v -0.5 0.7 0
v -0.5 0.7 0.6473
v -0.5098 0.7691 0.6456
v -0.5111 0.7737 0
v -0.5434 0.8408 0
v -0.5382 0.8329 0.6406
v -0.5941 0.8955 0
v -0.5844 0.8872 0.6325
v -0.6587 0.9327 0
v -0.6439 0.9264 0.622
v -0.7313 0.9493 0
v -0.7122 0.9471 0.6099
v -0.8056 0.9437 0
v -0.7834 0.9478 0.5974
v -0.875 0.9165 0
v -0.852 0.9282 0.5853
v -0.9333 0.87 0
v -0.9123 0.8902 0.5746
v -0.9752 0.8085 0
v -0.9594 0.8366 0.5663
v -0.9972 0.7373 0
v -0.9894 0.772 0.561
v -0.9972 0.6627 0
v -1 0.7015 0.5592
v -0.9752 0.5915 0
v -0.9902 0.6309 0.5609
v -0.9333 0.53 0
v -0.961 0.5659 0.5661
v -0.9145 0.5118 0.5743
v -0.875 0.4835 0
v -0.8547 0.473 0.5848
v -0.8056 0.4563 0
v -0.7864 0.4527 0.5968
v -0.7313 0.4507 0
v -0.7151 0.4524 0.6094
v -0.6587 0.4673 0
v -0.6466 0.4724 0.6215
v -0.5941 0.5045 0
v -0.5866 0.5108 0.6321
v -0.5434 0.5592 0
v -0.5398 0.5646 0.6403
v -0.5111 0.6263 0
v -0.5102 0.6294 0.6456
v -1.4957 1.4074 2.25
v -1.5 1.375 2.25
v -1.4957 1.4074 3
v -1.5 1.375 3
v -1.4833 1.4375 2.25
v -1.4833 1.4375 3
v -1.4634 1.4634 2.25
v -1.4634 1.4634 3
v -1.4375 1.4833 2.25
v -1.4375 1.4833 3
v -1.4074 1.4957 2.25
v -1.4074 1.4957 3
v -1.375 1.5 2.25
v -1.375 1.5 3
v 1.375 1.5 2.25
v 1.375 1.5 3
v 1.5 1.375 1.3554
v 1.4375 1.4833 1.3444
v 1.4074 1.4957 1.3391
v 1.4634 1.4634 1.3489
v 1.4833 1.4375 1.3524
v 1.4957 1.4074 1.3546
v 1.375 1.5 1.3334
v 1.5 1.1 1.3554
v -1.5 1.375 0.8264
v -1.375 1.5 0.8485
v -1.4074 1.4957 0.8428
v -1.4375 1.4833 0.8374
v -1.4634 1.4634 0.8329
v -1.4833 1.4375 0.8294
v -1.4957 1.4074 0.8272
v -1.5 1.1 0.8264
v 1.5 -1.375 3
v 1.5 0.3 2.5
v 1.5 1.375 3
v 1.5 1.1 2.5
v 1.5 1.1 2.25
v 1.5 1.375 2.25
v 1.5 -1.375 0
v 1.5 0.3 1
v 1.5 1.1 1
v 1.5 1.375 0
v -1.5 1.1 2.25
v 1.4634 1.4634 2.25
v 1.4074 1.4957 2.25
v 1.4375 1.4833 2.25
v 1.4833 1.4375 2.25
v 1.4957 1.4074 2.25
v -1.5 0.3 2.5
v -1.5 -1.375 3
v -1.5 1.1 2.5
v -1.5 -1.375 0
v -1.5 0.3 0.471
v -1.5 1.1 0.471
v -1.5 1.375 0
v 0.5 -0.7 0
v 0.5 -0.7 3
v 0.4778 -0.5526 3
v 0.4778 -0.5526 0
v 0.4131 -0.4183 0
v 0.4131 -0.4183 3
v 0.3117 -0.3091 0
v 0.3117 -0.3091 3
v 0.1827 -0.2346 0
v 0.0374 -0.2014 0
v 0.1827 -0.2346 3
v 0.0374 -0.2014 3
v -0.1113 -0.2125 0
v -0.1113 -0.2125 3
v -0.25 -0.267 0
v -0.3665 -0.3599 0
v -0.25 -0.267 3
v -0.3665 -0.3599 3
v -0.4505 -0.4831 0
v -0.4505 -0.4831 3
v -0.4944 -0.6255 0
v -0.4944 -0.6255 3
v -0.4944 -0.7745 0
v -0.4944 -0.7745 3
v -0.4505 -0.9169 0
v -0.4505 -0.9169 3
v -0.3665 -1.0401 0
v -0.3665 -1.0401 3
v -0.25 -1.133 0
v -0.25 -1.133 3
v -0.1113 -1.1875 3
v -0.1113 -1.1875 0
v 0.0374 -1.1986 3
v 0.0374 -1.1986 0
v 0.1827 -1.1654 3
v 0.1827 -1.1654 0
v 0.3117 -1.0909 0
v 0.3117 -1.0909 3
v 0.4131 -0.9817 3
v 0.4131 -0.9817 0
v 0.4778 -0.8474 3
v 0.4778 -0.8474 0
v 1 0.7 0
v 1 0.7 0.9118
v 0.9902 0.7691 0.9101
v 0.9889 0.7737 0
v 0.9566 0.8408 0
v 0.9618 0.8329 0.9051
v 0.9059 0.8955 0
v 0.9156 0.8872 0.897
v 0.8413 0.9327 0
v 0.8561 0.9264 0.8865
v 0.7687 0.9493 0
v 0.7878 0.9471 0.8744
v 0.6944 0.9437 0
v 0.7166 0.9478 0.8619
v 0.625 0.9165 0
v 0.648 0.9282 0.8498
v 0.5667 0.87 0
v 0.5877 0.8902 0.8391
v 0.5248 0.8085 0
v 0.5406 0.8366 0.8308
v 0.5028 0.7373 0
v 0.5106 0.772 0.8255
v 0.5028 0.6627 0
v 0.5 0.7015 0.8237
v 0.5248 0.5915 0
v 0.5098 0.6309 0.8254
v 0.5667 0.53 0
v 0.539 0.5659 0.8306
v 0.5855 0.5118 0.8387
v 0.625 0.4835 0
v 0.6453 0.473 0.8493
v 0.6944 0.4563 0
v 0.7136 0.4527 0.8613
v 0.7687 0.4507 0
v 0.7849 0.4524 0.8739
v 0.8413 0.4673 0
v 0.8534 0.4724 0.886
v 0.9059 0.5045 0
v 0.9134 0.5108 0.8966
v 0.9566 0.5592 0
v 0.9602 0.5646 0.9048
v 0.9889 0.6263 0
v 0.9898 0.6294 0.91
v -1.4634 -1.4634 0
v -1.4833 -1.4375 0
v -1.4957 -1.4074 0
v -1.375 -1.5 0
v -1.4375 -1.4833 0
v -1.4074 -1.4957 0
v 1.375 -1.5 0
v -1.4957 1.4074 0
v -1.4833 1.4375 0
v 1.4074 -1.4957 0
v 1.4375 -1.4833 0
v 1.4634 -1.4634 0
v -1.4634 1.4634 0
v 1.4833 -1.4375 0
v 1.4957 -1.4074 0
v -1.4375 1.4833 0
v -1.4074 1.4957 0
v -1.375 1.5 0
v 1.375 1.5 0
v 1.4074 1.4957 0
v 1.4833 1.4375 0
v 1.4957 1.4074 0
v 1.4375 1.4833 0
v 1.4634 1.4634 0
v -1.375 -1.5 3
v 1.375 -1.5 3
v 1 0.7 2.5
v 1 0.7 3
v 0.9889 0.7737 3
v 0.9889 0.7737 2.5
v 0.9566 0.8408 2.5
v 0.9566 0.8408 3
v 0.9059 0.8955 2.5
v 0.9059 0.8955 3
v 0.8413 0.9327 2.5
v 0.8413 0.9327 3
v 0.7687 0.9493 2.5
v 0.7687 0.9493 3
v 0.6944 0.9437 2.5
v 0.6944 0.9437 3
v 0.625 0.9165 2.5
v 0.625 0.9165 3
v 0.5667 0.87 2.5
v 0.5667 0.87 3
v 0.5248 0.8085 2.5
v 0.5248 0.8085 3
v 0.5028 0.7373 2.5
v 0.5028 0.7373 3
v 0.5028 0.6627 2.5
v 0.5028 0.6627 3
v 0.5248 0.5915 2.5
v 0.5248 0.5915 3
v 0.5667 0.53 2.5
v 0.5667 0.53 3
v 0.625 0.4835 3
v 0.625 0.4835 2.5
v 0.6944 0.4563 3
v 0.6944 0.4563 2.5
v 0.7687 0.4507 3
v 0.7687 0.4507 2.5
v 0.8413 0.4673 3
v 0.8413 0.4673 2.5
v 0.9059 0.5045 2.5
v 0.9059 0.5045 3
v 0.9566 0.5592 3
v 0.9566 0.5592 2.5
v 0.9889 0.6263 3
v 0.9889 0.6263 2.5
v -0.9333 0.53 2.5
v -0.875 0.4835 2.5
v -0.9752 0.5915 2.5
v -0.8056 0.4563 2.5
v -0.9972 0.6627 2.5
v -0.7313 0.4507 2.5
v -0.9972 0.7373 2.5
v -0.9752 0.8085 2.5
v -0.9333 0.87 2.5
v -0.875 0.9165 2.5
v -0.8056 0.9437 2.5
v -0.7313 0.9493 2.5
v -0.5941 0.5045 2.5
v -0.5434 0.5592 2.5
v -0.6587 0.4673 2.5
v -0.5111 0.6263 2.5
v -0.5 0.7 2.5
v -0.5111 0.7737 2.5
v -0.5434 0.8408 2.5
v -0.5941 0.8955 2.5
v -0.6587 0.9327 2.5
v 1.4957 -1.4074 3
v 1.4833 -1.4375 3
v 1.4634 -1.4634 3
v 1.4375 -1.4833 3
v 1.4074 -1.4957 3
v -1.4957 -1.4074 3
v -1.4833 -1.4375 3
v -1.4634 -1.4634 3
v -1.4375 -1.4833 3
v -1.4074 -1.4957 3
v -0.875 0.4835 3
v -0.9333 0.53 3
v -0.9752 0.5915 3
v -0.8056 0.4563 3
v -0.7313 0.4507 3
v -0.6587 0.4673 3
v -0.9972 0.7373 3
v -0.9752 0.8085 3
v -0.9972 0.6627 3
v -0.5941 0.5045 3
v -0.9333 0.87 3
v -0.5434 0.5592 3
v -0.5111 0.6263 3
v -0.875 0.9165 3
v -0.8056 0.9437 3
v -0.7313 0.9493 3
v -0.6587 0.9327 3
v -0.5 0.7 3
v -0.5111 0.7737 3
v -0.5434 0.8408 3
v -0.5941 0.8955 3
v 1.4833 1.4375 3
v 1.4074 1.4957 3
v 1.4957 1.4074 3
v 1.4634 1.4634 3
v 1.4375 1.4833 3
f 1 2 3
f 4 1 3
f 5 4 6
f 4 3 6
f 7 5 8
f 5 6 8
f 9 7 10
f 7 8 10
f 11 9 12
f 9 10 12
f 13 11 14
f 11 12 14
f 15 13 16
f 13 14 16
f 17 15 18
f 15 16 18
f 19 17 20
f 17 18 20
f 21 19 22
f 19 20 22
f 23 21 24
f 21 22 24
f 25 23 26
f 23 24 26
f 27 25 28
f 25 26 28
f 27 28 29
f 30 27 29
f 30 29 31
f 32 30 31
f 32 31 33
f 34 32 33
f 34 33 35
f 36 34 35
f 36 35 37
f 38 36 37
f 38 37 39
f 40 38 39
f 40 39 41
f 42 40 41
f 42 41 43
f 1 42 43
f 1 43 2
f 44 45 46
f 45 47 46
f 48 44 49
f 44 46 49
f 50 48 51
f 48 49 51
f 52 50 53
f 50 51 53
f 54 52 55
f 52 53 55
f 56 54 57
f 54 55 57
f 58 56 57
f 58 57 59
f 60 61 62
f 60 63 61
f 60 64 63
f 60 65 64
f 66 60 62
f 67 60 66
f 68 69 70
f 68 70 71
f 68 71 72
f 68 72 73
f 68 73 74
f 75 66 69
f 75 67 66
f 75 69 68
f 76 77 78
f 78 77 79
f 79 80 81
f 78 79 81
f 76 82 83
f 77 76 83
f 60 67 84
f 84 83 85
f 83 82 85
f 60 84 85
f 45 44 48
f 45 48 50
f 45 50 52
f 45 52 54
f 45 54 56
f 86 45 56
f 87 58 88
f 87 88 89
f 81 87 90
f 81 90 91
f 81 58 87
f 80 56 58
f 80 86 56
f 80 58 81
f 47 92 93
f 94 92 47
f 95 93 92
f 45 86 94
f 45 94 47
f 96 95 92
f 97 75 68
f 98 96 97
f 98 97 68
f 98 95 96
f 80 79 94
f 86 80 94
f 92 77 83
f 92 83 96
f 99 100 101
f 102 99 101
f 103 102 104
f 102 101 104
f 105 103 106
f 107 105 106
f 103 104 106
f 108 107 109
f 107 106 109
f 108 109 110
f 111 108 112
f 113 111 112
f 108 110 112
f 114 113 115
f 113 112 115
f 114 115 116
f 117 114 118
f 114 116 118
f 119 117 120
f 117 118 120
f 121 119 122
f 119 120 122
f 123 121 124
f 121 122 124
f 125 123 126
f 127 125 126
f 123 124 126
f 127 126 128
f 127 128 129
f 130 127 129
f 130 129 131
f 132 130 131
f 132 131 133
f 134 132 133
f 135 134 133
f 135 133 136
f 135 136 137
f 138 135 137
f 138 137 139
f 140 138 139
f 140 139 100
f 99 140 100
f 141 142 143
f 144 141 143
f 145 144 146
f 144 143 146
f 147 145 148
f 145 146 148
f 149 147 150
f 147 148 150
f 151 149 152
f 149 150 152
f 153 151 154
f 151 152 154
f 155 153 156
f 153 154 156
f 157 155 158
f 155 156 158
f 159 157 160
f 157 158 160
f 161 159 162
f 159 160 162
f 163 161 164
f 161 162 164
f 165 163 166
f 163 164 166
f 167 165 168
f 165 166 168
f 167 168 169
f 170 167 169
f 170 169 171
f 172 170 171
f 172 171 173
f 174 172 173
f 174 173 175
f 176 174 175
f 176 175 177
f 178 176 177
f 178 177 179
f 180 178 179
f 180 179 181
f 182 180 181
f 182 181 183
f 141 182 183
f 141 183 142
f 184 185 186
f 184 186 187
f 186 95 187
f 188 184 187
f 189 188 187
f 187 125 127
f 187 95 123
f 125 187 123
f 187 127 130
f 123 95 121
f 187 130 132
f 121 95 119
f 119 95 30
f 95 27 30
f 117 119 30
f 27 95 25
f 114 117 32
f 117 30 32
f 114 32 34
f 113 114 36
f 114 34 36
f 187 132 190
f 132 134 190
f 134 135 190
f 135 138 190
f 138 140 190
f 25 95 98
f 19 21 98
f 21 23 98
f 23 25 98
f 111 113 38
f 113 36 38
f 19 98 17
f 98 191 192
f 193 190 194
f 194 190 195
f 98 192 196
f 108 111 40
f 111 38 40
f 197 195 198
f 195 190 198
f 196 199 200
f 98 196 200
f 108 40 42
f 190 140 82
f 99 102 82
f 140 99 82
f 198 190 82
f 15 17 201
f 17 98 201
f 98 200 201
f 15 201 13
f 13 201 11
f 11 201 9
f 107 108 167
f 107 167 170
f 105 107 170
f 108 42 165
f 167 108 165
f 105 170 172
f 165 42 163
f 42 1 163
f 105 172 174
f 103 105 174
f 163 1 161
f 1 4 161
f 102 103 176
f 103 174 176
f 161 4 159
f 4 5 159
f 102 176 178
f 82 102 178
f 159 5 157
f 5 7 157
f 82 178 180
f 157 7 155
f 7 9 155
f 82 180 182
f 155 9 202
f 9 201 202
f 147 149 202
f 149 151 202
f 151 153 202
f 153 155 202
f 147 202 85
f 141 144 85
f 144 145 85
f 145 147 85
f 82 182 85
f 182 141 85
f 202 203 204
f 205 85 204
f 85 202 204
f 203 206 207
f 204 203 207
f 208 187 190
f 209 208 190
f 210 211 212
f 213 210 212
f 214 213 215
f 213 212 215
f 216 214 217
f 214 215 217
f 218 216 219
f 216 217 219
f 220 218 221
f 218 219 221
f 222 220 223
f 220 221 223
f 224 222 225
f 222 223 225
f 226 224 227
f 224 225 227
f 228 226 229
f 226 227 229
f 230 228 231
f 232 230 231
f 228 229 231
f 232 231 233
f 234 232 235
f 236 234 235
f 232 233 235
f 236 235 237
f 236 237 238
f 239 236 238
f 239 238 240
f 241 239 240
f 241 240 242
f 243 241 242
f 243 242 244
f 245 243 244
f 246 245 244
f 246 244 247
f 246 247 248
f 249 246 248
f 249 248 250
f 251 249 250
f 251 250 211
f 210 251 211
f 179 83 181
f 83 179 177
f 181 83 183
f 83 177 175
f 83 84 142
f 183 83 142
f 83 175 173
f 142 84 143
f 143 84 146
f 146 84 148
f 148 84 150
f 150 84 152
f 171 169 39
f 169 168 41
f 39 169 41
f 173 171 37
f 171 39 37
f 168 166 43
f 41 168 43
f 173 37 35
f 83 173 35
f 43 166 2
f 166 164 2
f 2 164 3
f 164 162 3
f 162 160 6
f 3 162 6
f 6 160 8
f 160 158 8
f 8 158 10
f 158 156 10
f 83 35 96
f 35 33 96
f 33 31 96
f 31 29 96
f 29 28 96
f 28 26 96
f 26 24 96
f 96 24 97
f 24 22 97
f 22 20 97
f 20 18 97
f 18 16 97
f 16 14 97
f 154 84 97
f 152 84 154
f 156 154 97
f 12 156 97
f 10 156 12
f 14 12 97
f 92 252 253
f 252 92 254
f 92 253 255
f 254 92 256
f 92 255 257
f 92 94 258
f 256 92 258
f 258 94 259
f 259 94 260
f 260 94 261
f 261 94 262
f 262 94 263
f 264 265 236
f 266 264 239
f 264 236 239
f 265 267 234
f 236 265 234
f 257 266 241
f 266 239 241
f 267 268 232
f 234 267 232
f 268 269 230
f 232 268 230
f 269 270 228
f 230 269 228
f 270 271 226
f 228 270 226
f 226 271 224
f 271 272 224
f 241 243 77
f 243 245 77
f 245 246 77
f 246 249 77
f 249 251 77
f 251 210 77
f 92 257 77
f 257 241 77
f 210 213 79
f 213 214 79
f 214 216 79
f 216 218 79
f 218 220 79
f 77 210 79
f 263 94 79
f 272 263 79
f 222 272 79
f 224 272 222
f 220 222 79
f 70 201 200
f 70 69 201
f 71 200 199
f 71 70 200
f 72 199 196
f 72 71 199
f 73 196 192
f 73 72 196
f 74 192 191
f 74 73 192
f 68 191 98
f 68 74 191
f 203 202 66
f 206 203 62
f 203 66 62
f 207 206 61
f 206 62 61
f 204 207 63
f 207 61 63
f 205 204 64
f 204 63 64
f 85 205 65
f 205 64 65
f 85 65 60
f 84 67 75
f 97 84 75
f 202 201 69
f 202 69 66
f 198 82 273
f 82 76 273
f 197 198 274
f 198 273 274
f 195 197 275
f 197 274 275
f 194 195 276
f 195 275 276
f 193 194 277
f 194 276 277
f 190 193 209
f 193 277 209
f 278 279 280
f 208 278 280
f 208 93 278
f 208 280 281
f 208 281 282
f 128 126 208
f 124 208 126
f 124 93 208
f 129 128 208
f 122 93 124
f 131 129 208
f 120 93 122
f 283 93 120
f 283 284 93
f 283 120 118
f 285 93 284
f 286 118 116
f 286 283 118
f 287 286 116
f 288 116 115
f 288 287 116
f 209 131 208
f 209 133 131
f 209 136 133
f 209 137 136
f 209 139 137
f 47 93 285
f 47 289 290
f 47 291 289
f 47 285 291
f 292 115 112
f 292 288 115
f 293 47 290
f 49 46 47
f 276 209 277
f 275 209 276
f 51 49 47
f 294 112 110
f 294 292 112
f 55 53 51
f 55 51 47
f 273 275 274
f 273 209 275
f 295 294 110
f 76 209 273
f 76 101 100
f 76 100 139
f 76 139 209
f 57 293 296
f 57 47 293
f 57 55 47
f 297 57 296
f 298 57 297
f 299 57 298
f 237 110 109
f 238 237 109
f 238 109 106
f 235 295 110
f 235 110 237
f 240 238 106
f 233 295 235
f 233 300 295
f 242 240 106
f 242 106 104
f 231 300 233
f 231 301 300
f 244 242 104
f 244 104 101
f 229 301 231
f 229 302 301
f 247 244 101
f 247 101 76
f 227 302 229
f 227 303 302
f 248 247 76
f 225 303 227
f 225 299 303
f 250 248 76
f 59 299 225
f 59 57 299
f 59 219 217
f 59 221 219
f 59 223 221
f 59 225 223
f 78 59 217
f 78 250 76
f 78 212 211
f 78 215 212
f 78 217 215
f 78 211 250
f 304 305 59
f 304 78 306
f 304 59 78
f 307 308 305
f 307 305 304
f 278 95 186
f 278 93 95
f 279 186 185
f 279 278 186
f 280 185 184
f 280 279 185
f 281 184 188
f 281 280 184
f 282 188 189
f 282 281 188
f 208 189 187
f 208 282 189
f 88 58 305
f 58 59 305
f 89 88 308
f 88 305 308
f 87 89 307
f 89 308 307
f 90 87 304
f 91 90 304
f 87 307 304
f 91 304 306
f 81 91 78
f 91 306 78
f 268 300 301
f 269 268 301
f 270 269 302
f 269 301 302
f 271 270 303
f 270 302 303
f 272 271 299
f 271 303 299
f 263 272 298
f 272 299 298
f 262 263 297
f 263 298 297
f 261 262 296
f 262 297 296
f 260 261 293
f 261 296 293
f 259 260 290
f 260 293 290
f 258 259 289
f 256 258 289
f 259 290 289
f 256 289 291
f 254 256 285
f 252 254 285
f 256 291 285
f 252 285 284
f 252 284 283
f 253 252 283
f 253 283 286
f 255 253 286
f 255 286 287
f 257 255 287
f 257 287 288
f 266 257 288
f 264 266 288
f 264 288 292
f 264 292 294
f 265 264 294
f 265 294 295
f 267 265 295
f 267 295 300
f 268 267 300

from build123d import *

# Parameters (mm, degrees)
F0_W      = 3
F0_H      = 3
F1_DEPTH  = 3
F2_R      = 0.5
F3_DEPTH  = 25
F6_DEPTH  = 0.8
F8_DEPTH  = 1.05
F9_R      = 0.125
F10_R     = 0.125
F11_R     = 0.25
F12_DEPTH = 25


with BuildPart() as f1:
    # F0 (on Top) → F1 (new body)
    with BuildSketch(Plane.XY):
        Rectangle(F0_W, F0_H)
    extrude(amount=F1_DEPTH)

    # F2 (on face) → F3 (cut)
    with BuildSketch(Plane.XY.offset(3)):
        with Locations((0, -0.7)):
            Circle(F2_R)
    extrude(amount=-F3_DEPTH, mode=Mode.SUBTRACT)

    # F5 (on offset) → F6 (cut)
    with BuildSketch(Plane(origin=(0, 1.1, 0), x_dir=(-1, 0, 0), z_dir=(0, 1, 0))):
        Polygon((-1.5, 2.5), (-1.5, 1), (1.5, 0.4710190579), (1.5, 2.5), align=None)
    extrude(amount=-F6_DEPTH, mode=Mode.SUBTRACT)

    # F7 (on offset) → F8 (cut)
    with BuildSketch(Plane(origin=(0, 1.1, 0), x_dir=(-1, 0, 0), z_dir=(0, 1, 0))):
        Polygon((-1.5, 2.25), (-1.5, 1.3553993142), (1.5, 0.826418372), (1.5, 2.25), align=None)
    extrude(amount=F8_DEPTH, mode=Mode.SUBTRACT)

    # F9
    f9_edges = [f1.edges().sort_by_distance(p)[0] for p in [
        (1.5, 1.5, 0.6777),
        (1.5, 1.5, 2.625),
    ]]
    fillet(f9_edges, radius=F9_R)

    # F10
    f10_edges = [f1.edges().sort_by_distance(p)[0] for p in [
        (-1.5, 1.5, 2.625),
        (-1.5, 1.5, 0.413209),
        (-1.5, -1.5, 1.5),
        (1.5, -1.5, 1.5),
    ]]
    fillet(f10_edges, radius=F10_R)

    # F11 (on face) → F12 (cut)
    with BuildSketch(Plane.XY.offset(3)):
        with Locations((0.75, 0.7)):
            Circle(F11_R)
        with Locations((-0.75, 0.7)):
            Circle(F11_R)
    extrude(amount=-F12_DEPTH, mode=Mode.SUBTRACT)


solid = f1.part
